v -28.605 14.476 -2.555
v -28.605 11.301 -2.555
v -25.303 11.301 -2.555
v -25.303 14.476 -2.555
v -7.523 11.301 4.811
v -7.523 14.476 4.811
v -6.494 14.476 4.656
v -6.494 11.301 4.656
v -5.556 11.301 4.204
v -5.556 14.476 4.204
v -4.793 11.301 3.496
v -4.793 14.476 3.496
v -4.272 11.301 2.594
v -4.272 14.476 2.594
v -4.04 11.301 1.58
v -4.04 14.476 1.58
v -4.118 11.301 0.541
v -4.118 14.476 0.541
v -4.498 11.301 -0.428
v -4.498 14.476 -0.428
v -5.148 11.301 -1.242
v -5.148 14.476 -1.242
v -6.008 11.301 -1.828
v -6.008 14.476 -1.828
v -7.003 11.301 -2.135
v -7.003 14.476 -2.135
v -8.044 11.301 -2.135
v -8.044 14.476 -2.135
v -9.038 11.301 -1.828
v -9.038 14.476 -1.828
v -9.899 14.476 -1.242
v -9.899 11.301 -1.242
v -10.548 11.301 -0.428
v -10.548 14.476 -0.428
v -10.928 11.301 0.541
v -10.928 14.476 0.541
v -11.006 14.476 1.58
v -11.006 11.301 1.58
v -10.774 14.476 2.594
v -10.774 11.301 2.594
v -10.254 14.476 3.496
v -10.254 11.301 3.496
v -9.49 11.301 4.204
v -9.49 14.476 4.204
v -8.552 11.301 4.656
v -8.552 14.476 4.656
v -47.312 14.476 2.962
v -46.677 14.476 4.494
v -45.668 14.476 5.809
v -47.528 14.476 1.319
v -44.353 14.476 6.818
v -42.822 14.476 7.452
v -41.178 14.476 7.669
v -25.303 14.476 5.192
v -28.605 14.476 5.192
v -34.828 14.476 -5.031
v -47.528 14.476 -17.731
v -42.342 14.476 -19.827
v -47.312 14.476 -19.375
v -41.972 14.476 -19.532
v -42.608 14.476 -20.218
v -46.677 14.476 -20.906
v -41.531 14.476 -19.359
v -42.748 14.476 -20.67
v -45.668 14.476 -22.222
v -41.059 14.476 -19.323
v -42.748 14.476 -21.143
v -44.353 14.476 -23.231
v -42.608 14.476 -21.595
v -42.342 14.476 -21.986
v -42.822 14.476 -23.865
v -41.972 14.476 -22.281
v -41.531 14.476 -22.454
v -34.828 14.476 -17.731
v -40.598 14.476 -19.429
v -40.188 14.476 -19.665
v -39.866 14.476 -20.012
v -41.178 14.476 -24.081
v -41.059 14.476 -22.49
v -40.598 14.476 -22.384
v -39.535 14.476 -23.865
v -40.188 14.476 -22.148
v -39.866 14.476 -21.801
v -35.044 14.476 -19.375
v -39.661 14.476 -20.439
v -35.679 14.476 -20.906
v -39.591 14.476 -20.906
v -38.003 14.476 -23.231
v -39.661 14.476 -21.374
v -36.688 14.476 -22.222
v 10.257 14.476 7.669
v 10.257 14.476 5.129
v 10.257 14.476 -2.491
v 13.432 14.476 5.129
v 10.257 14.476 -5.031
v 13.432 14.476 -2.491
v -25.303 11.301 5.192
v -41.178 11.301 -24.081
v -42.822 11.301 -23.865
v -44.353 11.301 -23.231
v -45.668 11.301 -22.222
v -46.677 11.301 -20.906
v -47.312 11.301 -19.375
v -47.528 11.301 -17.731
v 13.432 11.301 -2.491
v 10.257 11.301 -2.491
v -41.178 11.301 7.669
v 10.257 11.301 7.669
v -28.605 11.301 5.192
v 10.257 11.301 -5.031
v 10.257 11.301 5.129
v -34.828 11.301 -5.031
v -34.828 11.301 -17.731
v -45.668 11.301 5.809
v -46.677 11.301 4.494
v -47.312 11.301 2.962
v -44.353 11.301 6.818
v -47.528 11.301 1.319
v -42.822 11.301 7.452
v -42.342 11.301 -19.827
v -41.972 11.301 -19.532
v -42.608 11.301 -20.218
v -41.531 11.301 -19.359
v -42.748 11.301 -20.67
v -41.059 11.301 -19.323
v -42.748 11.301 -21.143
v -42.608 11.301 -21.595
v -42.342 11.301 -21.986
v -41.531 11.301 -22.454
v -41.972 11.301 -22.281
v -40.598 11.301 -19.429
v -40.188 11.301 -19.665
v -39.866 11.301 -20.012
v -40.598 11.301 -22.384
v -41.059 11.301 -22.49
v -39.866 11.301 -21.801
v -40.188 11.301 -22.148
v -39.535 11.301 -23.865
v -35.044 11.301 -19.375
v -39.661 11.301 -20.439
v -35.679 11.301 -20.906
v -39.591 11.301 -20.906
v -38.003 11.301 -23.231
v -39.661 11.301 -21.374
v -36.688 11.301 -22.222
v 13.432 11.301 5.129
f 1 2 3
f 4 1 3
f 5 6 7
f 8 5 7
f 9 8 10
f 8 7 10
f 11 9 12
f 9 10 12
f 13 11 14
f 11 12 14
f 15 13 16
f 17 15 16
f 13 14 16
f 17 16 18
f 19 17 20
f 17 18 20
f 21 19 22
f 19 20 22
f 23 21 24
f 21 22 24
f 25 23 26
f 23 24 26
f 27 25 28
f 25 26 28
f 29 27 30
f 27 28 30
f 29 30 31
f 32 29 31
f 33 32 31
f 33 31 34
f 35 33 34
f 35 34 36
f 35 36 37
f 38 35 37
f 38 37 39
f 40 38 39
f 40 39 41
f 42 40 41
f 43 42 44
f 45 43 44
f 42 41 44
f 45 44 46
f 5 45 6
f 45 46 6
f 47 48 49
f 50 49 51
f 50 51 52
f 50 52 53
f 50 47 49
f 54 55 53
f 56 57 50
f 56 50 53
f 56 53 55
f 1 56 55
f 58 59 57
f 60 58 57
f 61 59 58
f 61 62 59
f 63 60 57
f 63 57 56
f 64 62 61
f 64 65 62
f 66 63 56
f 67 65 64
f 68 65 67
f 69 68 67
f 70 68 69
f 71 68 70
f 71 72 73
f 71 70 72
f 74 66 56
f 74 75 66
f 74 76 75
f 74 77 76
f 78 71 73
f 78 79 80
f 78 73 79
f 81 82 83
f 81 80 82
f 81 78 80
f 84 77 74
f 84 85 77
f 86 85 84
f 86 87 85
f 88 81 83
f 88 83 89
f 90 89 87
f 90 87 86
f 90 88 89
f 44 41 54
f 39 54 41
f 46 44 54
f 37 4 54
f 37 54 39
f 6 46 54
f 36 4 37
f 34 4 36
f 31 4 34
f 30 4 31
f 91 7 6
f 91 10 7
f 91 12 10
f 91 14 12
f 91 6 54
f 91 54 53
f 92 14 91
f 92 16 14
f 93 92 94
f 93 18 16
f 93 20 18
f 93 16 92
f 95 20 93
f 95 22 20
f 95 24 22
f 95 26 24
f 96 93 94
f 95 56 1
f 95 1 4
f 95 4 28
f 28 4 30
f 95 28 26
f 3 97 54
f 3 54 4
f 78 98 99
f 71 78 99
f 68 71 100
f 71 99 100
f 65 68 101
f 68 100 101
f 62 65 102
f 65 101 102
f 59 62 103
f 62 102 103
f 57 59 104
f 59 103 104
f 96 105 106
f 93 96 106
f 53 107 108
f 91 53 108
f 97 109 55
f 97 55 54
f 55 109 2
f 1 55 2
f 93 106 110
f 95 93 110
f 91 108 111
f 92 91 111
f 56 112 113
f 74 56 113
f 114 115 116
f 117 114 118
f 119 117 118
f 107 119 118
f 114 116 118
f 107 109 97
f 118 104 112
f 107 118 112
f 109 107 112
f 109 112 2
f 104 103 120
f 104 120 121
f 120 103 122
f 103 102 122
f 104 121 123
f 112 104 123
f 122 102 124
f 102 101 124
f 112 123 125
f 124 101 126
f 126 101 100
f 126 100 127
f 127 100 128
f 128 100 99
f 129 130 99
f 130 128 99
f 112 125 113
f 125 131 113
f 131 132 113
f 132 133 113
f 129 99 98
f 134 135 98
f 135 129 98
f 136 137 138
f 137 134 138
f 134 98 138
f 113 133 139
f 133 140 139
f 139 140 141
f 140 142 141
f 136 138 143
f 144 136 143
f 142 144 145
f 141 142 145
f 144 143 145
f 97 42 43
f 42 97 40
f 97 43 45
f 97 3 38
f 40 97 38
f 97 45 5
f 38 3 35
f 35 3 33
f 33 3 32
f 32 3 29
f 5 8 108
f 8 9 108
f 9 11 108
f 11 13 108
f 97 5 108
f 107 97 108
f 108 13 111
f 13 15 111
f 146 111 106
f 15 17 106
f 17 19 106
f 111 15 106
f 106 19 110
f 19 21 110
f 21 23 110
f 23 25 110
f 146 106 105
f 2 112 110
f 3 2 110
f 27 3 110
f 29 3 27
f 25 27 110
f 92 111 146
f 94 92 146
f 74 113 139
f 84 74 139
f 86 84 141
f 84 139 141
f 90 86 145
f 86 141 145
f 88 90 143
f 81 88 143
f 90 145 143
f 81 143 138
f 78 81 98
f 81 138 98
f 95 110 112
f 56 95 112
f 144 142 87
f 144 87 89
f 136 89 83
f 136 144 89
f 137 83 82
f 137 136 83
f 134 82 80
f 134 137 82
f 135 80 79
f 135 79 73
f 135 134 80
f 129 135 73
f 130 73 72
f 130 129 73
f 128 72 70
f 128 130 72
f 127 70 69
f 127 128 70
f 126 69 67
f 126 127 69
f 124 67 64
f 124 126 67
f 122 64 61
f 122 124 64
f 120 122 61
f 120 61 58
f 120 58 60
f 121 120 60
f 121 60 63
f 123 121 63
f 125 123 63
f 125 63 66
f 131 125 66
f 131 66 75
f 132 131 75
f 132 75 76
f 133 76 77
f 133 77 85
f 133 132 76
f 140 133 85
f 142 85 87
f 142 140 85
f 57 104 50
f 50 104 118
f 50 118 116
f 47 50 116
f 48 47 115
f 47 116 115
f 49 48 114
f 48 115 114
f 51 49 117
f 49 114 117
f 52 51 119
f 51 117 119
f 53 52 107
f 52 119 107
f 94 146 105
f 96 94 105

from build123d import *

# Parameters (mm, degrees)
HEX_START                = 11.30066774
HEX_OUTER_SIDE_OUTLINE_W = 3.302
HEX_OUTER_SIDE_OUTLINE_H = 7.747
HEX_OUTER_SIDE_OUTLINE_R = 1.5875
HEX_OUTER_SIDE_DEPTH     = 3.175
SKETCH1_R                = 3.4925
CUT_EXTRUDE1_DEPTH       = 3.175


# Read off the part's stored shape, not the designer's step: Hex Outer Side
with BuildPart() as part:
    # Hex Outer Side outline → Hex Outer Side (new body)
    with BuildSketch(Plane(origin=(0, 0, 0), x_dir=(1, 0, 0), z_dir=(0, 1, 0)).offset(HEX_START)):
        with BuildLine():
            Line((-47.528050259, 17.731483109), (-47.528050259, -1.318516891))
            ThreePointArc((-47.528050259, -1.318516891), (-45.66817832, -5.808644951), (-41.178050259, -7.668516891))
            Line((-41.178050259, -7.668516891), (10.256949741, -7.668516891))
            Line((10.256949741, -7.668516891), (10.256949741, -5.128516891))
            Line((10.256949741, -5.128516891), (13.431949741, -5.128516891))
            Line((13.431949741, -5.128516891), (13.431949741, 2.491483109))
            Line((13.431949741, 2.491483109), (10.256949741, 2.491483109))
            Line((10.256949741, 2.491483109), (10.256949741, 5.031483109))
            Line((10.256949741, 5.031483109), (-34.828050259, 5.031483109))
            Line((-34.828050259, 5.031483109), (-34.828050259, 17.731483109))
            ThreePointArc((-34.828050259, 17.731483109), (-36.687922199, 22.22161117), (-41.178050259, 24.081483109))
            ThreePointArc((-41.178050259, 24.081483109), (-45.668178319, 22.221611169), (-47.528050259, 17.731483109))
        make_face()
        with Locations((-26.954050259, -1.318516891)):
            Rectangle(HEX_OUTER_SIDE_OUTLINE_W, HEX_OUTER_SIDE_OUTLINE_H, mode=Mode.SUBTRACT)
        with Locations((-41.178050259, 20.906483109)):
            Circle(HEX_OUTER_SIDE_OUTLINE_R, mode=Mode.SUBTRACT)
    extrude(amount=HEX_OUTER_SIDE_DEPTH)

    # Sketch1 → Cut-Extrude1 (cut)
    with BuildSketch(Plane(origin=(0, 14.47566774, 0), x_dir=(1, 0, 0), z_dir=(0, 1, 0))):
        with Locations(Location((-7.523050259, -1.318516891, 0), (0, 0, 270))):
            Circle(SKETCH1_R)
    extrude(amount=-CUT_EXTRUDE1_DEPTH, mode=Mode.SUBTRACT)


solid = part.part
